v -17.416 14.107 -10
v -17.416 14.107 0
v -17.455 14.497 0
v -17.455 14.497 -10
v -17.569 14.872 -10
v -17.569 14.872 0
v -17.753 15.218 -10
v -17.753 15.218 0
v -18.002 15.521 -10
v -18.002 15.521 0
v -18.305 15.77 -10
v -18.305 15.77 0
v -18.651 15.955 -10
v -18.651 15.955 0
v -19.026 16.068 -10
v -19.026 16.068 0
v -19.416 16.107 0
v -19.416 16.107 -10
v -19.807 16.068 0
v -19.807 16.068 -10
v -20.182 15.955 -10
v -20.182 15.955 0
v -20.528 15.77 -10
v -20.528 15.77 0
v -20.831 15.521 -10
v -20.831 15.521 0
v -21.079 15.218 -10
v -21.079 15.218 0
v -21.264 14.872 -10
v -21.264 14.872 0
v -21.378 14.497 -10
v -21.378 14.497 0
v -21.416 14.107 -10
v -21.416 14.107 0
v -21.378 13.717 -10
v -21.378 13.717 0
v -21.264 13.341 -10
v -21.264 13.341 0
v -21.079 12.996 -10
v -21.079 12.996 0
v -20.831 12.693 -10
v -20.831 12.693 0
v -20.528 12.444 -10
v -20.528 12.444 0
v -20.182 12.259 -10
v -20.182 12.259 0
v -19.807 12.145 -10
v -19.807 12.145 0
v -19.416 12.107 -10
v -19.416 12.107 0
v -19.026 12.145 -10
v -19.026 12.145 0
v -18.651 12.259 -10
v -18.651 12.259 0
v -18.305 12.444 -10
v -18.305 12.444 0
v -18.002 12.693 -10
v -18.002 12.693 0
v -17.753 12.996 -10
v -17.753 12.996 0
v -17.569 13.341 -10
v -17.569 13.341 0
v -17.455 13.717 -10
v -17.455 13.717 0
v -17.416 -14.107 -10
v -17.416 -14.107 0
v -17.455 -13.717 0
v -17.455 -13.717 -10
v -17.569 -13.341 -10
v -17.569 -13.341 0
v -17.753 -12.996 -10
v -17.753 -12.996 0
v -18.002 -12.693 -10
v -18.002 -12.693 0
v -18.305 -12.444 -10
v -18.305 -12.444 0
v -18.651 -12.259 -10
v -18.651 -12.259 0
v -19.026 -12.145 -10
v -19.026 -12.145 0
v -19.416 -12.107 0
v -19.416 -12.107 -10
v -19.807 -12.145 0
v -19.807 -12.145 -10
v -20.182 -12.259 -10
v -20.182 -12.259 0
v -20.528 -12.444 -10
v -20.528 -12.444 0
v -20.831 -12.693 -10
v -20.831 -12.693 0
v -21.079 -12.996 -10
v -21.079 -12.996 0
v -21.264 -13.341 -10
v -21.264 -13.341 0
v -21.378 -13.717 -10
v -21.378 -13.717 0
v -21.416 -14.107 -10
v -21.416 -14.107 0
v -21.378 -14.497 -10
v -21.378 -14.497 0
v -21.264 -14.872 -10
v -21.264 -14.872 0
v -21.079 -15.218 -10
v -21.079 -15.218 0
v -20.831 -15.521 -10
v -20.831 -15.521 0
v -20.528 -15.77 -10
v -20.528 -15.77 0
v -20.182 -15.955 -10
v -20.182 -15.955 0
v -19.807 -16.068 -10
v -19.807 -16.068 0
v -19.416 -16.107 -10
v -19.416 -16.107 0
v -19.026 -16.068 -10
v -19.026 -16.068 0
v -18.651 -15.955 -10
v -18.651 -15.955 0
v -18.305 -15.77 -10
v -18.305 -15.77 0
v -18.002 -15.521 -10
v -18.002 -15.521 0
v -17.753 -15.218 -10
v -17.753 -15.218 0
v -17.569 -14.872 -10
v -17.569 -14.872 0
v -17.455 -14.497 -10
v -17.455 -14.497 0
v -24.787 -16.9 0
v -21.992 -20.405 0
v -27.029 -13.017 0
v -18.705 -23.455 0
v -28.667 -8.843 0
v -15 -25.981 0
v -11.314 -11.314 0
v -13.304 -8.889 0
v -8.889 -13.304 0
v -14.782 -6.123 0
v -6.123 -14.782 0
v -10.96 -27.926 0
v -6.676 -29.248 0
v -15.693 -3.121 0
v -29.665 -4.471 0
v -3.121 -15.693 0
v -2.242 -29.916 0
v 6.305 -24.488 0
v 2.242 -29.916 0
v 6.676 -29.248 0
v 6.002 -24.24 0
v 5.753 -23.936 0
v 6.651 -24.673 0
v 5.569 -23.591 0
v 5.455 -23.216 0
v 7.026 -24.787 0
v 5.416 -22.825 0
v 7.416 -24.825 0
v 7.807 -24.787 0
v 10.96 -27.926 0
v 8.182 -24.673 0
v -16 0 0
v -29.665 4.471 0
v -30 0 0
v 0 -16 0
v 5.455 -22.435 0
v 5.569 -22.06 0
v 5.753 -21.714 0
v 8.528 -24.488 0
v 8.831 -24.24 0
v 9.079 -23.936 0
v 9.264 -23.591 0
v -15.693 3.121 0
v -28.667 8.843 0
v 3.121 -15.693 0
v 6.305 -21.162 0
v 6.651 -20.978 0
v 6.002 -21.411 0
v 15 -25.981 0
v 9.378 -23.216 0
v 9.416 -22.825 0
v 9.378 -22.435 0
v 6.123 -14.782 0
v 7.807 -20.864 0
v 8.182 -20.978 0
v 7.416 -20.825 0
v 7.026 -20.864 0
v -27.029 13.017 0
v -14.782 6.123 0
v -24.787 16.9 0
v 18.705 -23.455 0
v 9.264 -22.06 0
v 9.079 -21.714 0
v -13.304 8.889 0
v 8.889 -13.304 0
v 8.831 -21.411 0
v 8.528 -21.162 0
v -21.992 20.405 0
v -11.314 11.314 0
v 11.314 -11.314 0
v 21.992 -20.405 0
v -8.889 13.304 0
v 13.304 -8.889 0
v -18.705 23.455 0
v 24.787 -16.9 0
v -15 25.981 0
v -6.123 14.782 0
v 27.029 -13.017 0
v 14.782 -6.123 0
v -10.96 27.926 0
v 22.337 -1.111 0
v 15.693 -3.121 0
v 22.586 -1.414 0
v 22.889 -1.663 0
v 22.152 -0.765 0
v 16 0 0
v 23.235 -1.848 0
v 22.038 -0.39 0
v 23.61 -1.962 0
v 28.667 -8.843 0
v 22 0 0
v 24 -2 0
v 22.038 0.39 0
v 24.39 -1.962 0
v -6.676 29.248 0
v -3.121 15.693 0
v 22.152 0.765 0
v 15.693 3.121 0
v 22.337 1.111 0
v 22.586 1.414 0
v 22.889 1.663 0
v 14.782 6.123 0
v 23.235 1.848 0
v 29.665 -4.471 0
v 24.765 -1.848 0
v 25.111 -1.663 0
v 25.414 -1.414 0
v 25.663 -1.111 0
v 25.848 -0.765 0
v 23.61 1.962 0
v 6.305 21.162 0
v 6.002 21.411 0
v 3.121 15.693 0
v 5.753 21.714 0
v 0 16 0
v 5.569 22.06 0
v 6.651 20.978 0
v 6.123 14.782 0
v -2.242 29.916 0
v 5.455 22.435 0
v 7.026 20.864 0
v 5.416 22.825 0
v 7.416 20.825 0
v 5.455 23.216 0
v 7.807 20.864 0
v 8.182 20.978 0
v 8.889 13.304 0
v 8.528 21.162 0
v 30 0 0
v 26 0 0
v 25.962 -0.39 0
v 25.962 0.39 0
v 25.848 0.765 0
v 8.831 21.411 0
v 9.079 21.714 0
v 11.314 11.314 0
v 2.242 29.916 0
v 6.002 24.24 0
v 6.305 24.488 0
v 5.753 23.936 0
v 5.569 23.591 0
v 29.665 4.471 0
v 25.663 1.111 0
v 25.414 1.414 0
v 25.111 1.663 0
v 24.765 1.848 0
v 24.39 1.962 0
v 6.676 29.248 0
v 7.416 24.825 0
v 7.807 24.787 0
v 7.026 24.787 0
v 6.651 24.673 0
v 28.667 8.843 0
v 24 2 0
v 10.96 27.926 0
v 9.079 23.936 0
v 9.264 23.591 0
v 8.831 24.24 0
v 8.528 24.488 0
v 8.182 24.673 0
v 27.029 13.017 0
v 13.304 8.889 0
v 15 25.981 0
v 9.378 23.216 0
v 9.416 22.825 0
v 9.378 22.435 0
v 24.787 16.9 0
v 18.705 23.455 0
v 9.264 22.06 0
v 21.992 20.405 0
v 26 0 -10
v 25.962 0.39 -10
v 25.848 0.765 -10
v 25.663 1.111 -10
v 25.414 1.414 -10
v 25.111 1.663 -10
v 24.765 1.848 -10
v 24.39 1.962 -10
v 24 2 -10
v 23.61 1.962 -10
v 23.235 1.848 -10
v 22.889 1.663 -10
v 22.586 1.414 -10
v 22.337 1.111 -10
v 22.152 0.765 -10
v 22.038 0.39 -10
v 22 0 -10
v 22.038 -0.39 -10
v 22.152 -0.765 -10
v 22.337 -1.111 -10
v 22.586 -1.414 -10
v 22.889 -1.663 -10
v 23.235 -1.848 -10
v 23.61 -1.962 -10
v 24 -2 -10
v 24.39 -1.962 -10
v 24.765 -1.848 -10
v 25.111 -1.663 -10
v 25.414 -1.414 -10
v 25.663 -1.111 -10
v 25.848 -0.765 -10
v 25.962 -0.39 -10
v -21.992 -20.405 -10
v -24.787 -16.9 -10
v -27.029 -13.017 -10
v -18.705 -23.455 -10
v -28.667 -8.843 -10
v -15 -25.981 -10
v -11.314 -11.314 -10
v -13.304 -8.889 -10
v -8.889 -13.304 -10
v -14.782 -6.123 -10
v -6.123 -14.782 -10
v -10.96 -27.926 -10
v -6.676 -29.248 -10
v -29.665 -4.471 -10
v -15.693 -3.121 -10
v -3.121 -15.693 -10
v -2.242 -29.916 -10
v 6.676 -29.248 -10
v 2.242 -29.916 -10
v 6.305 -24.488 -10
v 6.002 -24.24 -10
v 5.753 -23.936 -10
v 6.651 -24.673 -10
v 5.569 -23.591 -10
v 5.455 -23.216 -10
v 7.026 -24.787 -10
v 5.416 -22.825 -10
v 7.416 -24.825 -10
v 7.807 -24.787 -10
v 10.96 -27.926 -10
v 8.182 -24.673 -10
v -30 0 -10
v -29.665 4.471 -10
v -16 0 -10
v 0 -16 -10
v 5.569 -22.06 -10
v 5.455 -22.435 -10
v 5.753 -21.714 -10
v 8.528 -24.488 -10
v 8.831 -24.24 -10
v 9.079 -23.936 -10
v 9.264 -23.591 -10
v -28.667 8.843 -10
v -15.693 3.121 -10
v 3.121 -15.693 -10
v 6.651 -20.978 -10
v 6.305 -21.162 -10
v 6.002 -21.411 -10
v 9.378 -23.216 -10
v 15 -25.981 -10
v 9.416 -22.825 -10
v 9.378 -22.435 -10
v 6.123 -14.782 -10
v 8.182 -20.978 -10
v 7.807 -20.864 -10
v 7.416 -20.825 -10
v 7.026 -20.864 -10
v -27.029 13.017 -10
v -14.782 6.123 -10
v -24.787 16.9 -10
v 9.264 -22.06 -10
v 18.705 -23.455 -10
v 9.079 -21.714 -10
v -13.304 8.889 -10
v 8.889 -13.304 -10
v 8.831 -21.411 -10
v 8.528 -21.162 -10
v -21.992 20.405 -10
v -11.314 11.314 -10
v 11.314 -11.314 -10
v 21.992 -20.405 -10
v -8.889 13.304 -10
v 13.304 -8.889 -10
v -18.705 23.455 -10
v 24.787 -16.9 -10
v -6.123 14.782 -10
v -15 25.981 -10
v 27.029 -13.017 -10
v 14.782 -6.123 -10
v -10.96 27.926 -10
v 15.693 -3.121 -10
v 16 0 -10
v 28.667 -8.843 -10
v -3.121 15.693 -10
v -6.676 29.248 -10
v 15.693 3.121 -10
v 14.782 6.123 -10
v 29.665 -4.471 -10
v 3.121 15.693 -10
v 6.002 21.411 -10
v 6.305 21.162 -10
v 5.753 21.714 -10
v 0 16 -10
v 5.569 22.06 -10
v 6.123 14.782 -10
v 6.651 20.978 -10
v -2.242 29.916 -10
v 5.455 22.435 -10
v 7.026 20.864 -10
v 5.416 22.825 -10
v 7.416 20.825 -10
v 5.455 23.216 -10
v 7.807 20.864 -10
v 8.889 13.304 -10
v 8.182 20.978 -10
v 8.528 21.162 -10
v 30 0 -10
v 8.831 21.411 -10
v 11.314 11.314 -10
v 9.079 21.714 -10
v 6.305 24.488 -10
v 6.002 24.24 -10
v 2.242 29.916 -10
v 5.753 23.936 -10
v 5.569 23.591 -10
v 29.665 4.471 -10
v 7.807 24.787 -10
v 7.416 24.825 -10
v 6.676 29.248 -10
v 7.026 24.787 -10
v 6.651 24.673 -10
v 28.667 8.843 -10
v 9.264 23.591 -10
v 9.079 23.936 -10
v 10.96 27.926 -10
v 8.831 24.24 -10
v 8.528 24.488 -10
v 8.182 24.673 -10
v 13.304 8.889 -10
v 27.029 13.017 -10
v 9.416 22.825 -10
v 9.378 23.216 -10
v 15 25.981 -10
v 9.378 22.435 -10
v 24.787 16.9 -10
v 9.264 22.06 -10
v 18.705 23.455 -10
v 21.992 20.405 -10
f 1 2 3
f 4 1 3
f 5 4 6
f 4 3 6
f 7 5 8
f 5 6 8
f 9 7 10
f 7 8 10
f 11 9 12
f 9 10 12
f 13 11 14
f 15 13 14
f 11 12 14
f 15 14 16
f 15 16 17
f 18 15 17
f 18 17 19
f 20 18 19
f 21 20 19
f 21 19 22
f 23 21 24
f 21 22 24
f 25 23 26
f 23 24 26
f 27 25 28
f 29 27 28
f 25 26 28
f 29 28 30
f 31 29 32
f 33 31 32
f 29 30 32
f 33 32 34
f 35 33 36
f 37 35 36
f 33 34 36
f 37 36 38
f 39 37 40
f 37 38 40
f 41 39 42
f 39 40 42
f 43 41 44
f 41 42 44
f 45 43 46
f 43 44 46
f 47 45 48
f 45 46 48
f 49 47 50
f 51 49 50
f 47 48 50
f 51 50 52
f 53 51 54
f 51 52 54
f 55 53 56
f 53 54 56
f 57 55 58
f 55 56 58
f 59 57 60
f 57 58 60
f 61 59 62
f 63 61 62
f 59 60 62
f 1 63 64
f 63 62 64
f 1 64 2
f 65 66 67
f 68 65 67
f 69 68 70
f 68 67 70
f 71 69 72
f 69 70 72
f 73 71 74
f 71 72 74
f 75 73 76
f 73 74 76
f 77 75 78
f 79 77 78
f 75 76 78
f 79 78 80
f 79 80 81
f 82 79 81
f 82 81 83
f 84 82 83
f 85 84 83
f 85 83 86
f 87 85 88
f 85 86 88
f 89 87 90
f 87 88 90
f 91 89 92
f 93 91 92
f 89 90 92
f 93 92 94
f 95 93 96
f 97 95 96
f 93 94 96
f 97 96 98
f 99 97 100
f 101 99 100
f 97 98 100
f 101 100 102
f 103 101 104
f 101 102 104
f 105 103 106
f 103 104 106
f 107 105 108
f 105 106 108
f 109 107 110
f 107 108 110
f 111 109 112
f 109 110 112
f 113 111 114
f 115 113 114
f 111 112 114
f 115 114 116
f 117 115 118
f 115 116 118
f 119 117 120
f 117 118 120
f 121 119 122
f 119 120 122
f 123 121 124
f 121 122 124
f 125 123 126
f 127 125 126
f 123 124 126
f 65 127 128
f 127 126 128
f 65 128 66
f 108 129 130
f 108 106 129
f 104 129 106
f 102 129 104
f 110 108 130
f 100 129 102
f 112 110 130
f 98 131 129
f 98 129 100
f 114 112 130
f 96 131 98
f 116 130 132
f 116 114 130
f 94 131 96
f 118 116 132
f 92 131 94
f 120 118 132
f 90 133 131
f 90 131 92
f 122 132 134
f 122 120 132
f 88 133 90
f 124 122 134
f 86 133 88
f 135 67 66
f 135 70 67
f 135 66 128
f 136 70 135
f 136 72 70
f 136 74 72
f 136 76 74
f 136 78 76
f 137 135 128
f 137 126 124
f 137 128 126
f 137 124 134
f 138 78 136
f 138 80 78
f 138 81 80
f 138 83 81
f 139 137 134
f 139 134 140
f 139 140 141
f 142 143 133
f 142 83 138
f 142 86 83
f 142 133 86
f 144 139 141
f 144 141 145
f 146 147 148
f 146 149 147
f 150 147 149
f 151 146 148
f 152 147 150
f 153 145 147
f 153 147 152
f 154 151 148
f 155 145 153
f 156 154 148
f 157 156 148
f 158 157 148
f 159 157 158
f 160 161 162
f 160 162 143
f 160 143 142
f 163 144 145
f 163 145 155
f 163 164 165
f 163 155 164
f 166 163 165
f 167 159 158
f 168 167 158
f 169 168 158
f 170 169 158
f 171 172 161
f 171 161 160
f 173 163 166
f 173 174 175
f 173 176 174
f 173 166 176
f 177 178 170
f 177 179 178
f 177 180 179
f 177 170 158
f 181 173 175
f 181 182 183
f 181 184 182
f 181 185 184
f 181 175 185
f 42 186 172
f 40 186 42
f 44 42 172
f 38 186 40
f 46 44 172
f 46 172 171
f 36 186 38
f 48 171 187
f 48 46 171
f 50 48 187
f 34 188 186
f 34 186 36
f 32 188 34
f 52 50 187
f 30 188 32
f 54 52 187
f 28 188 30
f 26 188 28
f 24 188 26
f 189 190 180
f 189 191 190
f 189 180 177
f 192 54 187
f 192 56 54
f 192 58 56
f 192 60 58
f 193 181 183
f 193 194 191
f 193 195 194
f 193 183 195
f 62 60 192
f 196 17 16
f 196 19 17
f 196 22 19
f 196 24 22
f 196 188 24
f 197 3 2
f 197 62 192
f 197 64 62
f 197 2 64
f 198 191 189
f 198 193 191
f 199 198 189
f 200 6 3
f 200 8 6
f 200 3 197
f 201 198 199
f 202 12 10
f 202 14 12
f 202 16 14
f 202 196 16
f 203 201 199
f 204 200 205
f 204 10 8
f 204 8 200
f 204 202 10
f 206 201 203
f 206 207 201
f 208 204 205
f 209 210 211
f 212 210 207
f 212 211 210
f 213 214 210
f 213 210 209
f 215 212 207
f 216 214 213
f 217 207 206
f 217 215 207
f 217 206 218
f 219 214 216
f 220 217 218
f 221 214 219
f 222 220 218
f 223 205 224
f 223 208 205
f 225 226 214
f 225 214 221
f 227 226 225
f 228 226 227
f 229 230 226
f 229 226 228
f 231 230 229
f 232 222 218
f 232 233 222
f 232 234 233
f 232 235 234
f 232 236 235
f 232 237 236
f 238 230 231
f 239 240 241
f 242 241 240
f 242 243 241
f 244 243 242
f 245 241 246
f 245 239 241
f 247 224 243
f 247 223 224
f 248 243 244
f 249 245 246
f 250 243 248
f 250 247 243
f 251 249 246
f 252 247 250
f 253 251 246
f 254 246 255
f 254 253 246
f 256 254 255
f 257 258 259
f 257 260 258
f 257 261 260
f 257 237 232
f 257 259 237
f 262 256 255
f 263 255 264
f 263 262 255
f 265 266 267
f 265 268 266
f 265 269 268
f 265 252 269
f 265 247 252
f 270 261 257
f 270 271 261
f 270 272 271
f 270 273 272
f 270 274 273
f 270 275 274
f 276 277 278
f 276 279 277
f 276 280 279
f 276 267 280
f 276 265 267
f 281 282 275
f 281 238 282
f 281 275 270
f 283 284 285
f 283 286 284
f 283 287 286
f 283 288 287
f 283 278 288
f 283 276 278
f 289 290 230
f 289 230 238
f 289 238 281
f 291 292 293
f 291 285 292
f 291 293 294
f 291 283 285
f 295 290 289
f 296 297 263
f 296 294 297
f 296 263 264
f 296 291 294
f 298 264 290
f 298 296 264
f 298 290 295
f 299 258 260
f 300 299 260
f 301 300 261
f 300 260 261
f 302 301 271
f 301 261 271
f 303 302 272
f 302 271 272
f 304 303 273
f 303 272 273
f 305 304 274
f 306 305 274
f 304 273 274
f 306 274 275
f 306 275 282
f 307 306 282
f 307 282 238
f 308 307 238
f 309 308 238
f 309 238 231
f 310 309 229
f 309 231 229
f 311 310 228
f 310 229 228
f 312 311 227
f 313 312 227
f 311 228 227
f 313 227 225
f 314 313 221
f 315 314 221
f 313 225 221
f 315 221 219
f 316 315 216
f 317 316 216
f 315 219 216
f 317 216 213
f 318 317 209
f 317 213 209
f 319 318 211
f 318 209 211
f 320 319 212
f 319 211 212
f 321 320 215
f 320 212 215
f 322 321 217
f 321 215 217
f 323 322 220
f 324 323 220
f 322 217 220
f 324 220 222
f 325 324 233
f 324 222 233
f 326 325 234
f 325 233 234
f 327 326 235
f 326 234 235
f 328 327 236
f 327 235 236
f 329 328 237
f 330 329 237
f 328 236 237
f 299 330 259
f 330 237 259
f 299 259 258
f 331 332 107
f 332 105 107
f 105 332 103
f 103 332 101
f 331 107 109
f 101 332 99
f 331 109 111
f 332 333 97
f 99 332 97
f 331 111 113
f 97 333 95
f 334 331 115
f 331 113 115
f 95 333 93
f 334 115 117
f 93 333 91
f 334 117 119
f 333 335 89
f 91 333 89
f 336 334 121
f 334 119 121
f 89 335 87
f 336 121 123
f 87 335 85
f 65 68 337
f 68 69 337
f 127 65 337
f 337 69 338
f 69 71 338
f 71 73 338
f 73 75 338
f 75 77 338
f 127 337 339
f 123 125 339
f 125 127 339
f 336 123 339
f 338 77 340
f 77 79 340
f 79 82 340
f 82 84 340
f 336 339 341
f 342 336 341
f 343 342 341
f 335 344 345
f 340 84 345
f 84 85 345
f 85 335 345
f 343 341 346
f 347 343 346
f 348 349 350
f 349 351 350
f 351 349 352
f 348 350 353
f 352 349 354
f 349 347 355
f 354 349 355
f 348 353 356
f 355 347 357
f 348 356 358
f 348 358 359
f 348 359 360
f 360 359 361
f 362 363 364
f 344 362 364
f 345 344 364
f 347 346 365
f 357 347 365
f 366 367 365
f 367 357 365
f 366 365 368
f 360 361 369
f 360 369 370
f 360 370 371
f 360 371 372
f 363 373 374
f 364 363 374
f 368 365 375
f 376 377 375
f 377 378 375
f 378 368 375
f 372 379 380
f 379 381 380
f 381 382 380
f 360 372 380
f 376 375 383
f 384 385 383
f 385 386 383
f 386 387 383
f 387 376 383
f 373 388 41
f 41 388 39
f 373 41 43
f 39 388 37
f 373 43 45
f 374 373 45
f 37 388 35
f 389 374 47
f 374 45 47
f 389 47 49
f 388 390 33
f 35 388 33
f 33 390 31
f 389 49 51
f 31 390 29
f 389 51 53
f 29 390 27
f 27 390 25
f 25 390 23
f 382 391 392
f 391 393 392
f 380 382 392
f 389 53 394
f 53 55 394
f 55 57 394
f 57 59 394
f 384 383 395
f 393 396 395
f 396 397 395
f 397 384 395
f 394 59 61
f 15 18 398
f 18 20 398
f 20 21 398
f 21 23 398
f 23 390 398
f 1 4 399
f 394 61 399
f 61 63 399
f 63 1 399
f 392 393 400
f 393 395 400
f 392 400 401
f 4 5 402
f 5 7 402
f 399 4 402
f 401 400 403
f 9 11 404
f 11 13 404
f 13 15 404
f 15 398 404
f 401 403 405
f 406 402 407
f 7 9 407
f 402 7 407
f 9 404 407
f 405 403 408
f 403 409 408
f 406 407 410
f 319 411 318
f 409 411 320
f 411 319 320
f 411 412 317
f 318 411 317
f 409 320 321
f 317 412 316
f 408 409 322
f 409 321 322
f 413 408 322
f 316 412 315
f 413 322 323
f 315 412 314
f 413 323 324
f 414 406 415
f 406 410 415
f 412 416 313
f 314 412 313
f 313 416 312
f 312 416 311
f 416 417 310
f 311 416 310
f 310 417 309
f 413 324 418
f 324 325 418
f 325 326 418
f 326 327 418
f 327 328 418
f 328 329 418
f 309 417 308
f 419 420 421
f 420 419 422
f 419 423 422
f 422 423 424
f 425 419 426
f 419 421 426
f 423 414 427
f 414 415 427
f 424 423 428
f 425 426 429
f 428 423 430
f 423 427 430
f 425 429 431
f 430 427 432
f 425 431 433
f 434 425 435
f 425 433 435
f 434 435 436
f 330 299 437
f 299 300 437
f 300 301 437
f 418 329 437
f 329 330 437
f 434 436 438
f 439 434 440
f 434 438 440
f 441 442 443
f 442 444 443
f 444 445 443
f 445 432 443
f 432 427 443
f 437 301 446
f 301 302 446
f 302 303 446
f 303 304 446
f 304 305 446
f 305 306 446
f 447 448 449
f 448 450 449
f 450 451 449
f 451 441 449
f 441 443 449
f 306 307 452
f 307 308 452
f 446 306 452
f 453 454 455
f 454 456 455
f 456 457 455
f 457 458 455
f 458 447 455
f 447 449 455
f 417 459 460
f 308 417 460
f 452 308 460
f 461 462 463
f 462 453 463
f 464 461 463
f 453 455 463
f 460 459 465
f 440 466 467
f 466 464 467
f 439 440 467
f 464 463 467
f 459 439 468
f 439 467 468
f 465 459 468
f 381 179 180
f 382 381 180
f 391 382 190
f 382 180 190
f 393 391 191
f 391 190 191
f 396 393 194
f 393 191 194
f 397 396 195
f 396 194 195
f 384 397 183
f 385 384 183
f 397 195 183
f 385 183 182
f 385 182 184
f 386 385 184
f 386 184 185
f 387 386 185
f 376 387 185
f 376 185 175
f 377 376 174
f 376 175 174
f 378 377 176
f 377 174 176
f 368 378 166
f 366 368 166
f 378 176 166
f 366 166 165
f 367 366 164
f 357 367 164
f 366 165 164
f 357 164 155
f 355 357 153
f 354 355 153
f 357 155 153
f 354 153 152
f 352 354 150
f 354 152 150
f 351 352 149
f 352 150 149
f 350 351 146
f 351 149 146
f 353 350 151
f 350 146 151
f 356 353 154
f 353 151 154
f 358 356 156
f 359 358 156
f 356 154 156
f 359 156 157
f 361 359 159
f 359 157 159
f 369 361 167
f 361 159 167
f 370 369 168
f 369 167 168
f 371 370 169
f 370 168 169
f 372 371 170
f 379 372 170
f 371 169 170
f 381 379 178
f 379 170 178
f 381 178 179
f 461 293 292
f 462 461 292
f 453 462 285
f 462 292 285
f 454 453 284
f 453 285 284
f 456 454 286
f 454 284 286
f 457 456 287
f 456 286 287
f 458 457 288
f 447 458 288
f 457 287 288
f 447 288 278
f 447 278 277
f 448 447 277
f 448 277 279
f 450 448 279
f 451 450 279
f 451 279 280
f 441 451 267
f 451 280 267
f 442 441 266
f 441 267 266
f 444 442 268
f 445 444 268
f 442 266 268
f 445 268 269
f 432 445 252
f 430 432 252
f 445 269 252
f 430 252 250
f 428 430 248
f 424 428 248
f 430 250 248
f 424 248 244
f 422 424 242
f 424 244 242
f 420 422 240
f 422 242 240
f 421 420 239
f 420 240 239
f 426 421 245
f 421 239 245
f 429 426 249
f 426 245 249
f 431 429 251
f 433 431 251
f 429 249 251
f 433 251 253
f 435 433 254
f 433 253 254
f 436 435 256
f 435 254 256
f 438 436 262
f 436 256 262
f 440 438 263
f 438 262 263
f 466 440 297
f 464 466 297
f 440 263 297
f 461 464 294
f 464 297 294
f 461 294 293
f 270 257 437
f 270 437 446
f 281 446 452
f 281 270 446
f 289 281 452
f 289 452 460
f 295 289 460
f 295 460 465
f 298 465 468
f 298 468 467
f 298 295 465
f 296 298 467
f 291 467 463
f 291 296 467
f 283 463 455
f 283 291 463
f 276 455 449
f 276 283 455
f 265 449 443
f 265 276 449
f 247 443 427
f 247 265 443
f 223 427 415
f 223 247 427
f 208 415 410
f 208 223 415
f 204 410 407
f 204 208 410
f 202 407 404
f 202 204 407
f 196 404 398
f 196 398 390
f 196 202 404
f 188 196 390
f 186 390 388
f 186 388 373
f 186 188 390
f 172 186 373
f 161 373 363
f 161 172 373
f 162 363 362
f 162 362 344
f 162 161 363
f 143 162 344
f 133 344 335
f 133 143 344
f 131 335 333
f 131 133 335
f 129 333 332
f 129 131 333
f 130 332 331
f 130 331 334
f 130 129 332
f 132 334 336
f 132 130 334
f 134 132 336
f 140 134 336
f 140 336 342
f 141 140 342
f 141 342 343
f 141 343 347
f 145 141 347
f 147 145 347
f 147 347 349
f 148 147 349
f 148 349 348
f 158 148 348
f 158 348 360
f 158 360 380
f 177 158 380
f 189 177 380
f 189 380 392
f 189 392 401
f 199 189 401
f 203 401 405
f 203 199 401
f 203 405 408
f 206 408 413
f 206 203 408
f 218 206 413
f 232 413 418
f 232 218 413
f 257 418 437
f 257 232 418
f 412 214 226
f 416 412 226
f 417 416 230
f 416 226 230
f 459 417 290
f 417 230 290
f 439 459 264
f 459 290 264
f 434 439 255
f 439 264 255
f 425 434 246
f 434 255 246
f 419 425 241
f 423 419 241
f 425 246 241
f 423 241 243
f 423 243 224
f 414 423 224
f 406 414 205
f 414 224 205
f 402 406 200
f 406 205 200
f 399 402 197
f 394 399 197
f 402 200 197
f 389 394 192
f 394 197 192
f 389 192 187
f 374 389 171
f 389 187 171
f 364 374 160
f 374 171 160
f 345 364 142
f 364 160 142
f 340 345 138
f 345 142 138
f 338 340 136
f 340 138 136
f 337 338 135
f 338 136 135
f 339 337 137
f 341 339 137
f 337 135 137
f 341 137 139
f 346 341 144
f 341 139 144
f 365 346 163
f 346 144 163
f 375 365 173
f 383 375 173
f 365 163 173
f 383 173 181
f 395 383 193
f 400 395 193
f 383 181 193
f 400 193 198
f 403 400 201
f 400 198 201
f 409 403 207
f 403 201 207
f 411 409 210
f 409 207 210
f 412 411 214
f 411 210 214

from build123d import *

# Parameters (mm, degrees)
SKETCH1_R           = 30
SKETCH1_R_2         = 16
SKETCH1_R_3         = 2
BOSS_EXTRUDE1_DEPTH = 10


with BuildPart() as part:
    # Sketch1 → Boss-Extrude1 (new body)
    with BuildSketch(Plane.XY):
        Circle(SKETCH1_R)
        Circle(SKETCH1_R_2, mode=Mode.SUBTRACT)
        with Locations((24, 0)):
            Circle(SKETCH1_R_3, mode=Mode.SUBTRACT)
        with Locations((7.416407865, -22.825356391)):
            Circle(SKETCH1_R_3, mode=Mode.SUBTRACT)
        with Locations((-19.416407865, -14.106846055)):
            Circle(SKETCH1_R_3, mode=Mode.SUBTRACT)
        with Locations((-19.416407865, 14.106846055)):
            Circle(SKETCH1_R_3, mode=Mode.SUBTRACT)
        with Locations((7.416407865, 22.825356391)):
            Circle(SKETCH1_R_3, mode=Mode.SUBTRACT)
    extrude(amount=-BOSS_EXTRUDE1_DEPTH)


solid = part.part
